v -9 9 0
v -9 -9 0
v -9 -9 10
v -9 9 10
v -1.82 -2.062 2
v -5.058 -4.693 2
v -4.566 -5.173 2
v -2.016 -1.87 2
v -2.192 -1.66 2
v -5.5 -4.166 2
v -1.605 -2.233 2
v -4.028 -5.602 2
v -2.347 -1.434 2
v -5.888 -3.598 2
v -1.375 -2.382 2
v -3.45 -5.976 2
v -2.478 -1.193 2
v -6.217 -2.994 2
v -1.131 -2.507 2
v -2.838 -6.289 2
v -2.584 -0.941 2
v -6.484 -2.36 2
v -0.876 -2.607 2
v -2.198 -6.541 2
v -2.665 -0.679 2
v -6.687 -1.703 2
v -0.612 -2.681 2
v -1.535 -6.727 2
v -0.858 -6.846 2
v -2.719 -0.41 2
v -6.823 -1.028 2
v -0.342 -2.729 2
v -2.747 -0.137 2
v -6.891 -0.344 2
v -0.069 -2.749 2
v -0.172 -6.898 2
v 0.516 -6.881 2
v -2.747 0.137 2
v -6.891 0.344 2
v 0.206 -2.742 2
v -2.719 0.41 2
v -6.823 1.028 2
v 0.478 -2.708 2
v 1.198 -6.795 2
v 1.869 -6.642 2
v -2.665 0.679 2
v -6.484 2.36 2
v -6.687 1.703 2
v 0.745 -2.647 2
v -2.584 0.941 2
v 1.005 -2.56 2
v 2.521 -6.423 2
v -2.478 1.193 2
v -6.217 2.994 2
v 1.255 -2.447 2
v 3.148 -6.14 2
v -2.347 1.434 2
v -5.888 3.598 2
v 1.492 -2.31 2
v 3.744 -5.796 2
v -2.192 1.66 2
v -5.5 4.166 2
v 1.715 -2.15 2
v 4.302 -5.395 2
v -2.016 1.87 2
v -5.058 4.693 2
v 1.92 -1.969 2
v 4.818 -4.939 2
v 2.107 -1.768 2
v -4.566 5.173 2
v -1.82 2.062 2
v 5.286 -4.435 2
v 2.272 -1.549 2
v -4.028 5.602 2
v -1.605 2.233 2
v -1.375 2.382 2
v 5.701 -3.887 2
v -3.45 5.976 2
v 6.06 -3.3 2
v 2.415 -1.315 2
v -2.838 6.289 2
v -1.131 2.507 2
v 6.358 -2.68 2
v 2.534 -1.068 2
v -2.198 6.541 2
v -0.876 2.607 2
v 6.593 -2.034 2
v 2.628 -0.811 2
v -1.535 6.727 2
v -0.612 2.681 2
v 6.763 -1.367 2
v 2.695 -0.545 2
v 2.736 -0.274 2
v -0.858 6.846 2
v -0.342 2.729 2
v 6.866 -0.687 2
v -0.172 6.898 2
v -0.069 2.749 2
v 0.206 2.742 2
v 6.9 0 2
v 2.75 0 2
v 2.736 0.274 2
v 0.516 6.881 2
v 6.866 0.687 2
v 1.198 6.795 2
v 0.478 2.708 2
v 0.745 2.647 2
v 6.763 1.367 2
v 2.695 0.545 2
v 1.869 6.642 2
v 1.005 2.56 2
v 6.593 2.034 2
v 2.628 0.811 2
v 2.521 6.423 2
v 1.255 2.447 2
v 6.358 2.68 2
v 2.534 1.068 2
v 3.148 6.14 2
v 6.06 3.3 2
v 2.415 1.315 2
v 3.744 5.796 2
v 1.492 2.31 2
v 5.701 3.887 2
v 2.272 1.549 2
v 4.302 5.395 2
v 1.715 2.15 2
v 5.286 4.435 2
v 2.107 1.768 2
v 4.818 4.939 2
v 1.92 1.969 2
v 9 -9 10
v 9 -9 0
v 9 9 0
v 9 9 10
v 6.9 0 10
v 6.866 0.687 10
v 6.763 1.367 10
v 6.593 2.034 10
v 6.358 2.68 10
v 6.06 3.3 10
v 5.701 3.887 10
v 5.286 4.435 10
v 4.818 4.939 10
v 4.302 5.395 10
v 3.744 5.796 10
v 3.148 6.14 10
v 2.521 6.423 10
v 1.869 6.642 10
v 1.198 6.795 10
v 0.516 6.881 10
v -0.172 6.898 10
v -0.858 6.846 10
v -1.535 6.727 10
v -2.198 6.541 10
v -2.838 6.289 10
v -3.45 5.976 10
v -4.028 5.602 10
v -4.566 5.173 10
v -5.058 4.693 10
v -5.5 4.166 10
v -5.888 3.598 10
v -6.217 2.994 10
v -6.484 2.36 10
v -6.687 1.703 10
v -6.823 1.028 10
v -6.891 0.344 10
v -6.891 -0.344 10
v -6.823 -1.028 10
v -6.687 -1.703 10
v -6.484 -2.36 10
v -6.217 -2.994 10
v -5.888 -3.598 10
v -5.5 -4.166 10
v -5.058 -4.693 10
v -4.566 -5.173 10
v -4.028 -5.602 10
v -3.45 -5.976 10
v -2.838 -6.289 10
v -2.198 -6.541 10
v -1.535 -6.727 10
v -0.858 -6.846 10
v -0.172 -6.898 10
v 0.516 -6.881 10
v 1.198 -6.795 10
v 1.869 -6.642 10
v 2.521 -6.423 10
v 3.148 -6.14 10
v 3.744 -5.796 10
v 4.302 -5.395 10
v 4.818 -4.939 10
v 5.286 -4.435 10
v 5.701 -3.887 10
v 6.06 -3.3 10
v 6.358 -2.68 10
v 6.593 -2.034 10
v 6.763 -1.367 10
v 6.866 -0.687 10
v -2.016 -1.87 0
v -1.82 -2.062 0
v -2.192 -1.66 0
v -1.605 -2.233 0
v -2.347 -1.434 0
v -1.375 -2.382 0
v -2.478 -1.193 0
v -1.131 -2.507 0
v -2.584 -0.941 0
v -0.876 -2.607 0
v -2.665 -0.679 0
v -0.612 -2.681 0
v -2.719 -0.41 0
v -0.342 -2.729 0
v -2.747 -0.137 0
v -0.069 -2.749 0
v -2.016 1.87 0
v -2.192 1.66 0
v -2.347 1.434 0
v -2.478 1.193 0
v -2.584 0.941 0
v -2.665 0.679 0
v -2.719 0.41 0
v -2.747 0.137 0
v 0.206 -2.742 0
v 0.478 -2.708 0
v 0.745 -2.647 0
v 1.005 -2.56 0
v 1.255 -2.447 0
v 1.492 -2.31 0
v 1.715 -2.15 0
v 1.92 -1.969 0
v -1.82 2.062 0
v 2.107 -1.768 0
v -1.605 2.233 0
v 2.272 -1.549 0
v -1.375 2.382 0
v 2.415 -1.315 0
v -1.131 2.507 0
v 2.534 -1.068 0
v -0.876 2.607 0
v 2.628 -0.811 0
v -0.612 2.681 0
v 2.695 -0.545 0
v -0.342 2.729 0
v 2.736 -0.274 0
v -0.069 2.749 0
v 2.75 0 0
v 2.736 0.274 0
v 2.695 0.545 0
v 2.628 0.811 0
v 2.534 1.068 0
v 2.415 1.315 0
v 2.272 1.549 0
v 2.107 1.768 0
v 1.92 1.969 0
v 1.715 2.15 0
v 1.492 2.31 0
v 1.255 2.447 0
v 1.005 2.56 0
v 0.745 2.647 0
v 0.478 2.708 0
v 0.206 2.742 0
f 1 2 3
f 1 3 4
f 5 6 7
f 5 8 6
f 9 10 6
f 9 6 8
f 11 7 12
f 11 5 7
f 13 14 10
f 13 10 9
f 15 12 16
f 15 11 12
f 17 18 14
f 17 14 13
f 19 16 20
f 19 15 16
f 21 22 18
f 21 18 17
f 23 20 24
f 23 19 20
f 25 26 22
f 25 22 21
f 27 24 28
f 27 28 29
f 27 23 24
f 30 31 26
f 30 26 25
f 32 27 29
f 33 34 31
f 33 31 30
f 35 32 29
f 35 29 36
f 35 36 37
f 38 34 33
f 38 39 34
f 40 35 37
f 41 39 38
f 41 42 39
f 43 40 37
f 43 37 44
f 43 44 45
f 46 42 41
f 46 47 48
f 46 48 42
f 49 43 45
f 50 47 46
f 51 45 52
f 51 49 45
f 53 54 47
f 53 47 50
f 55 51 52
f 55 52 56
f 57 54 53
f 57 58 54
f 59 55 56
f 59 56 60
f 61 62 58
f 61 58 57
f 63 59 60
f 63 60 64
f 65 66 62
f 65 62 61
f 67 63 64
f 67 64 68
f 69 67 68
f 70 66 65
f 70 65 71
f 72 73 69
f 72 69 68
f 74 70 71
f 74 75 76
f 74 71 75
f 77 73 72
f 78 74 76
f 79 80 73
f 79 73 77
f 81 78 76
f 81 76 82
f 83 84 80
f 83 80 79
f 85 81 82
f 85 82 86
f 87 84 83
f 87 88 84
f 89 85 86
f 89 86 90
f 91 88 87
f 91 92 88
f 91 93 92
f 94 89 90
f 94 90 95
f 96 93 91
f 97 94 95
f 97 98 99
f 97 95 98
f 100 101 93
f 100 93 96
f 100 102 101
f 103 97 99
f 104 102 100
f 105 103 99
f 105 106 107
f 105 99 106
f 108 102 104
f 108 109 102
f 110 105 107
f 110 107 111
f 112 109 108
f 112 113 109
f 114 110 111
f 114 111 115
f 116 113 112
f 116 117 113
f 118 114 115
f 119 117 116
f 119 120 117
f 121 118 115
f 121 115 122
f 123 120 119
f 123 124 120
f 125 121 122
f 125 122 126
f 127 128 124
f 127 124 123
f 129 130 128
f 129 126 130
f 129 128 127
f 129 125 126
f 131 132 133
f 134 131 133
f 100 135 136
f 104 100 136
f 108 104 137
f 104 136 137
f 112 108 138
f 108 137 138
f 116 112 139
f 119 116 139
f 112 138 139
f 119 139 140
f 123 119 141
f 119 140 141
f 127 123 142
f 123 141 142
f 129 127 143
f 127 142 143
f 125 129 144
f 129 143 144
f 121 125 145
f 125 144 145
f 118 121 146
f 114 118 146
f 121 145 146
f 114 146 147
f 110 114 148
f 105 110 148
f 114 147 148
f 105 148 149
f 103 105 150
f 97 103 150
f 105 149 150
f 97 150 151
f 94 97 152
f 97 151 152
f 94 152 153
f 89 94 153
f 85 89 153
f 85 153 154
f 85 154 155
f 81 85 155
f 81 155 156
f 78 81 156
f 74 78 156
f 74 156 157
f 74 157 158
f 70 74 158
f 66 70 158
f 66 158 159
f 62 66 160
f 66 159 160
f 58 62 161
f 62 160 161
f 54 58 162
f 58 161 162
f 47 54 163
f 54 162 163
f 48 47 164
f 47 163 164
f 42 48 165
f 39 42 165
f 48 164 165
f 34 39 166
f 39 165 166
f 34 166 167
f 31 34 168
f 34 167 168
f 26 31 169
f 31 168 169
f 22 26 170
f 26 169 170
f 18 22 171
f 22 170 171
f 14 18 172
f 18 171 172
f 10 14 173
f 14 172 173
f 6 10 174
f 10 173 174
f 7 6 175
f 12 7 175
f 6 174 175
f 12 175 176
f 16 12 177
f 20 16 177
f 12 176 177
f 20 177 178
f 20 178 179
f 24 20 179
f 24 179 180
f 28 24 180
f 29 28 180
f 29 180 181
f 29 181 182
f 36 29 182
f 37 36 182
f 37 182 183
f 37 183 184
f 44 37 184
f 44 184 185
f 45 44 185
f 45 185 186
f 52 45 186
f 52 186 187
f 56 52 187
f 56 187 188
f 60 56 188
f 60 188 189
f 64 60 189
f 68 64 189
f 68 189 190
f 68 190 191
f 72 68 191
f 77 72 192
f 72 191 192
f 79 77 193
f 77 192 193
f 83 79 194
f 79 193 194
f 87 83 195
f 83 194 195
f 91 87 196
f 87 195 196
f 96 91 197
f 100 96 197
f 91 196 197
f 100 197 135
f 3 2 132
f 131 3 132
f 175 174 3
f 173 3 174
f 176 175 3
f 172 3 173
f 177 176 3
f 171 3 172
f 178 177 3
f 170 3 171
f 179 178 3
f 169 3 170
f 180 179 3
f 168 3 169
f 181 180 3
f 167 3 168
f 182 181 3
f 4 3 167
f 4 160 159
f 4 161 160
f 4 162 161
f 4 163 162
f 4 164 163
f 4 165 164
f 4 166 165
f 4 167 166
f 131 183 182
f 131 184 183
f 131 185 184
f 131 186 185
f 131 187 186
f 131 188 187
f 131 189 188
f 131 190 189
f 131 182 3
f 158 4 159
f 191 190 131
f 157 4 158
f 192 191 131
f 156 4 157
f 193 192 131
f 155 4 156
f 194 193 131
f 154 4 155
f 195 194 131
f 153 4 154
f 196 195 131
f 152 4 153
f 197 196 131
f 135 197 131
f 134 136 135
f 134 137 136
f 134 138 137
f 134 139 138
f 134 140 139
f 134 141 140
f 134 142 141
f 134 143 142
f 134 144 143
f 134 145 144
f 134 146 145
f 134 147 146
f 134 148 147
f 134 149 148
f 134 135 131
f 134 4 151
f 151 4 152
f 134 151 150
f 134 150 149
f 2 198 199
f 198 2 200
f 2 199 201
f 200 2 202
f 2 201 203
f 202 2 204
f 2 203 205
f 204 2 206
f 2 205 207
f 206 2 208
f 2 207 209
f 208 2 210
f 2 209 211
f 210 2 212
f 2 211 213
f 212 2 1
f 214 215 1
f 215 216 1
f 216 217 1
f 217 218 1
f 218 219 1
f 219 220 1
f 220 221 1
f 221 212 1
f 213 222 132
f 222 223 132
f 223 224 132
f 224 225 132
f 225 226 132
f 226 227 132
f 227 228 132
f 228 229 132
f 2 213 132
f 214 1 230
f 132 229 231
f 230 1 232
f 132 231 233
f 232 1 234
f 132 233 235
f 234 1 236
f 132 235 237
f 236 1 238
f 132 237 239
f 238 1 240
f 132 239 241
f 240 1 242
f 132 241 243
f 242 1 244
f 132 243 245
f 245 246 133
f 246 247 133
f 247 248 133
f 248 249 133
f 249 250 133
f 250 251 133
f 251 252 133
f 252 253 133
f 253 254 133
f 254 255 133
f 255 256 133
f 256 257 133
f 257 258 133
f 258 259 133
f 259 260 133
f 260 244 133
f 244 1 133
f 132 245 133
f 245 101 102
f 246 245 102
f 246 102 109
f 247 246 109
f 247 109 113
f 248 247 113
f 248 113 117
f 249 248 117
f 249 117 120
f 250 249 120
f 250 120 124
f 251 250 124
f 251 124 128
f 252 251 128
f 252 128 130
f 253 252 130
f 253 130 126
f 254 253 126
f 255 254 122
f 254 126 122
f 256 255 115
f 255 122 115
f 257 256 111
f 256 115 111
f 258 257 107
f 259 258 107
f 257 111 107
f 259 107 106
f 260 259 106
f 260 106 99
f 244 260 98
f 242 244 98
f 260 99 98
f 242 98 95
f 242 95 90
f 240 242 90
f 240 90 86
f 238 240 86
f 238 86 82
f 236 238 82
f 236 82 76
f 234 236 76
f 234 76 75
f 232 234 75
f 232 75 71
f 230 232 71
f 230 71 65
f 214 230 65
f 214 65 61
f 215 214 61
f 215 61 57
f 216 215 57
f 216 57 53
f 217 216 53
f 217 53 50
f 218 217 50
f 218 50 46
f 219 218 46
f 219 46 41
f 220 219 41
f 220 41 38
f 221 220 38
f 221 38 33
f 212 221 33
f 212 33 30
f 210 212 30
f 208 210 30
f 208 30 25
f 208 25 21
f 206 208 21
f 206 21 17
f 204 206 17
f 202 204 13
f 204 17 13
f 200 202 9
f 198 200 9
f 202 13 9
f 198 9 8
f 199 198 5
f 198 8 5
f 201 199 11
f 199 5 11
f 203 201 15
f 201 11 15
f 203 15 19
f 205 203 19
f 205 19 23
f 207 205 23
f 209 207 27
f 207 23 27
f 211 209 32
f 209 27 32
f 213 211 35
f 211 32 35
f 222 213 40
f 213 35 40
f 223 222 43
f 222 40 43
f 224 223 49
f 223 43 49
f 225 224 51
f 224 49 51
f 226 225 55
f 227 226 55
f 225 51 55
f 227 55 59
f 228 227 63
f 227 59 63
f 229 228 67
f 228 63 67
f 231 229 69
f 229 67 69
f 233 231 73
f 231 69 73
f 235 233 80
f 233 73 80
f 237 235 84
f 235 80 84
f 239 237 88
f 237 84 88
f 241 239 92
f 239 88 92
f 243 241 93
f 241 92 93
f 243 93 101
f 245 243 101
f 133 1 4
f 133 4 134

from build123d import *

# Parameters (mm, degrees)
CROQUIS1_W              = 18
CROQUIS1_H              = 18
SALIENTE_EXTRUIR1_DEPTH = 10
CROQUIS2_R              = 6.9
CORTAR_EXTRUIR1_DEPTH   = 8
CROQUIS3_R              = 2.75
CORTAR_EXTRUIR2_DEPTH   = 8


with BuildPart() as part:
    # Croquis1 → Saliente-Extruir1 (new body)
    with BuildSketch(Plane.XY):
        Rectangle(CROQUIS1_W, CROQUIS1_H)
    extrude(amount=SALIENTE_EXTRUIR1_DEPTH)

    # Croquis2 → Cortar-Extruir1 (cut)
    with BuildSketch(Plane.XY.offset(10)):
        Circle(CROQUIS2_R)
    extrude(amount=-CORTAR_EXTRUIR1_DEPTH, mode=Mode.SUBTRACT)

    # Croquis3 → Cortar-Extruir2 (cut)
    with BuildSketch(Plane.XY.offset(2)):
        Circle(CROQUIS3_R)
    extrude(amount=-CORTAR_EXTRUIR2_DEPTH, mode=Mode.SUBTRACT)


solid = part.part
